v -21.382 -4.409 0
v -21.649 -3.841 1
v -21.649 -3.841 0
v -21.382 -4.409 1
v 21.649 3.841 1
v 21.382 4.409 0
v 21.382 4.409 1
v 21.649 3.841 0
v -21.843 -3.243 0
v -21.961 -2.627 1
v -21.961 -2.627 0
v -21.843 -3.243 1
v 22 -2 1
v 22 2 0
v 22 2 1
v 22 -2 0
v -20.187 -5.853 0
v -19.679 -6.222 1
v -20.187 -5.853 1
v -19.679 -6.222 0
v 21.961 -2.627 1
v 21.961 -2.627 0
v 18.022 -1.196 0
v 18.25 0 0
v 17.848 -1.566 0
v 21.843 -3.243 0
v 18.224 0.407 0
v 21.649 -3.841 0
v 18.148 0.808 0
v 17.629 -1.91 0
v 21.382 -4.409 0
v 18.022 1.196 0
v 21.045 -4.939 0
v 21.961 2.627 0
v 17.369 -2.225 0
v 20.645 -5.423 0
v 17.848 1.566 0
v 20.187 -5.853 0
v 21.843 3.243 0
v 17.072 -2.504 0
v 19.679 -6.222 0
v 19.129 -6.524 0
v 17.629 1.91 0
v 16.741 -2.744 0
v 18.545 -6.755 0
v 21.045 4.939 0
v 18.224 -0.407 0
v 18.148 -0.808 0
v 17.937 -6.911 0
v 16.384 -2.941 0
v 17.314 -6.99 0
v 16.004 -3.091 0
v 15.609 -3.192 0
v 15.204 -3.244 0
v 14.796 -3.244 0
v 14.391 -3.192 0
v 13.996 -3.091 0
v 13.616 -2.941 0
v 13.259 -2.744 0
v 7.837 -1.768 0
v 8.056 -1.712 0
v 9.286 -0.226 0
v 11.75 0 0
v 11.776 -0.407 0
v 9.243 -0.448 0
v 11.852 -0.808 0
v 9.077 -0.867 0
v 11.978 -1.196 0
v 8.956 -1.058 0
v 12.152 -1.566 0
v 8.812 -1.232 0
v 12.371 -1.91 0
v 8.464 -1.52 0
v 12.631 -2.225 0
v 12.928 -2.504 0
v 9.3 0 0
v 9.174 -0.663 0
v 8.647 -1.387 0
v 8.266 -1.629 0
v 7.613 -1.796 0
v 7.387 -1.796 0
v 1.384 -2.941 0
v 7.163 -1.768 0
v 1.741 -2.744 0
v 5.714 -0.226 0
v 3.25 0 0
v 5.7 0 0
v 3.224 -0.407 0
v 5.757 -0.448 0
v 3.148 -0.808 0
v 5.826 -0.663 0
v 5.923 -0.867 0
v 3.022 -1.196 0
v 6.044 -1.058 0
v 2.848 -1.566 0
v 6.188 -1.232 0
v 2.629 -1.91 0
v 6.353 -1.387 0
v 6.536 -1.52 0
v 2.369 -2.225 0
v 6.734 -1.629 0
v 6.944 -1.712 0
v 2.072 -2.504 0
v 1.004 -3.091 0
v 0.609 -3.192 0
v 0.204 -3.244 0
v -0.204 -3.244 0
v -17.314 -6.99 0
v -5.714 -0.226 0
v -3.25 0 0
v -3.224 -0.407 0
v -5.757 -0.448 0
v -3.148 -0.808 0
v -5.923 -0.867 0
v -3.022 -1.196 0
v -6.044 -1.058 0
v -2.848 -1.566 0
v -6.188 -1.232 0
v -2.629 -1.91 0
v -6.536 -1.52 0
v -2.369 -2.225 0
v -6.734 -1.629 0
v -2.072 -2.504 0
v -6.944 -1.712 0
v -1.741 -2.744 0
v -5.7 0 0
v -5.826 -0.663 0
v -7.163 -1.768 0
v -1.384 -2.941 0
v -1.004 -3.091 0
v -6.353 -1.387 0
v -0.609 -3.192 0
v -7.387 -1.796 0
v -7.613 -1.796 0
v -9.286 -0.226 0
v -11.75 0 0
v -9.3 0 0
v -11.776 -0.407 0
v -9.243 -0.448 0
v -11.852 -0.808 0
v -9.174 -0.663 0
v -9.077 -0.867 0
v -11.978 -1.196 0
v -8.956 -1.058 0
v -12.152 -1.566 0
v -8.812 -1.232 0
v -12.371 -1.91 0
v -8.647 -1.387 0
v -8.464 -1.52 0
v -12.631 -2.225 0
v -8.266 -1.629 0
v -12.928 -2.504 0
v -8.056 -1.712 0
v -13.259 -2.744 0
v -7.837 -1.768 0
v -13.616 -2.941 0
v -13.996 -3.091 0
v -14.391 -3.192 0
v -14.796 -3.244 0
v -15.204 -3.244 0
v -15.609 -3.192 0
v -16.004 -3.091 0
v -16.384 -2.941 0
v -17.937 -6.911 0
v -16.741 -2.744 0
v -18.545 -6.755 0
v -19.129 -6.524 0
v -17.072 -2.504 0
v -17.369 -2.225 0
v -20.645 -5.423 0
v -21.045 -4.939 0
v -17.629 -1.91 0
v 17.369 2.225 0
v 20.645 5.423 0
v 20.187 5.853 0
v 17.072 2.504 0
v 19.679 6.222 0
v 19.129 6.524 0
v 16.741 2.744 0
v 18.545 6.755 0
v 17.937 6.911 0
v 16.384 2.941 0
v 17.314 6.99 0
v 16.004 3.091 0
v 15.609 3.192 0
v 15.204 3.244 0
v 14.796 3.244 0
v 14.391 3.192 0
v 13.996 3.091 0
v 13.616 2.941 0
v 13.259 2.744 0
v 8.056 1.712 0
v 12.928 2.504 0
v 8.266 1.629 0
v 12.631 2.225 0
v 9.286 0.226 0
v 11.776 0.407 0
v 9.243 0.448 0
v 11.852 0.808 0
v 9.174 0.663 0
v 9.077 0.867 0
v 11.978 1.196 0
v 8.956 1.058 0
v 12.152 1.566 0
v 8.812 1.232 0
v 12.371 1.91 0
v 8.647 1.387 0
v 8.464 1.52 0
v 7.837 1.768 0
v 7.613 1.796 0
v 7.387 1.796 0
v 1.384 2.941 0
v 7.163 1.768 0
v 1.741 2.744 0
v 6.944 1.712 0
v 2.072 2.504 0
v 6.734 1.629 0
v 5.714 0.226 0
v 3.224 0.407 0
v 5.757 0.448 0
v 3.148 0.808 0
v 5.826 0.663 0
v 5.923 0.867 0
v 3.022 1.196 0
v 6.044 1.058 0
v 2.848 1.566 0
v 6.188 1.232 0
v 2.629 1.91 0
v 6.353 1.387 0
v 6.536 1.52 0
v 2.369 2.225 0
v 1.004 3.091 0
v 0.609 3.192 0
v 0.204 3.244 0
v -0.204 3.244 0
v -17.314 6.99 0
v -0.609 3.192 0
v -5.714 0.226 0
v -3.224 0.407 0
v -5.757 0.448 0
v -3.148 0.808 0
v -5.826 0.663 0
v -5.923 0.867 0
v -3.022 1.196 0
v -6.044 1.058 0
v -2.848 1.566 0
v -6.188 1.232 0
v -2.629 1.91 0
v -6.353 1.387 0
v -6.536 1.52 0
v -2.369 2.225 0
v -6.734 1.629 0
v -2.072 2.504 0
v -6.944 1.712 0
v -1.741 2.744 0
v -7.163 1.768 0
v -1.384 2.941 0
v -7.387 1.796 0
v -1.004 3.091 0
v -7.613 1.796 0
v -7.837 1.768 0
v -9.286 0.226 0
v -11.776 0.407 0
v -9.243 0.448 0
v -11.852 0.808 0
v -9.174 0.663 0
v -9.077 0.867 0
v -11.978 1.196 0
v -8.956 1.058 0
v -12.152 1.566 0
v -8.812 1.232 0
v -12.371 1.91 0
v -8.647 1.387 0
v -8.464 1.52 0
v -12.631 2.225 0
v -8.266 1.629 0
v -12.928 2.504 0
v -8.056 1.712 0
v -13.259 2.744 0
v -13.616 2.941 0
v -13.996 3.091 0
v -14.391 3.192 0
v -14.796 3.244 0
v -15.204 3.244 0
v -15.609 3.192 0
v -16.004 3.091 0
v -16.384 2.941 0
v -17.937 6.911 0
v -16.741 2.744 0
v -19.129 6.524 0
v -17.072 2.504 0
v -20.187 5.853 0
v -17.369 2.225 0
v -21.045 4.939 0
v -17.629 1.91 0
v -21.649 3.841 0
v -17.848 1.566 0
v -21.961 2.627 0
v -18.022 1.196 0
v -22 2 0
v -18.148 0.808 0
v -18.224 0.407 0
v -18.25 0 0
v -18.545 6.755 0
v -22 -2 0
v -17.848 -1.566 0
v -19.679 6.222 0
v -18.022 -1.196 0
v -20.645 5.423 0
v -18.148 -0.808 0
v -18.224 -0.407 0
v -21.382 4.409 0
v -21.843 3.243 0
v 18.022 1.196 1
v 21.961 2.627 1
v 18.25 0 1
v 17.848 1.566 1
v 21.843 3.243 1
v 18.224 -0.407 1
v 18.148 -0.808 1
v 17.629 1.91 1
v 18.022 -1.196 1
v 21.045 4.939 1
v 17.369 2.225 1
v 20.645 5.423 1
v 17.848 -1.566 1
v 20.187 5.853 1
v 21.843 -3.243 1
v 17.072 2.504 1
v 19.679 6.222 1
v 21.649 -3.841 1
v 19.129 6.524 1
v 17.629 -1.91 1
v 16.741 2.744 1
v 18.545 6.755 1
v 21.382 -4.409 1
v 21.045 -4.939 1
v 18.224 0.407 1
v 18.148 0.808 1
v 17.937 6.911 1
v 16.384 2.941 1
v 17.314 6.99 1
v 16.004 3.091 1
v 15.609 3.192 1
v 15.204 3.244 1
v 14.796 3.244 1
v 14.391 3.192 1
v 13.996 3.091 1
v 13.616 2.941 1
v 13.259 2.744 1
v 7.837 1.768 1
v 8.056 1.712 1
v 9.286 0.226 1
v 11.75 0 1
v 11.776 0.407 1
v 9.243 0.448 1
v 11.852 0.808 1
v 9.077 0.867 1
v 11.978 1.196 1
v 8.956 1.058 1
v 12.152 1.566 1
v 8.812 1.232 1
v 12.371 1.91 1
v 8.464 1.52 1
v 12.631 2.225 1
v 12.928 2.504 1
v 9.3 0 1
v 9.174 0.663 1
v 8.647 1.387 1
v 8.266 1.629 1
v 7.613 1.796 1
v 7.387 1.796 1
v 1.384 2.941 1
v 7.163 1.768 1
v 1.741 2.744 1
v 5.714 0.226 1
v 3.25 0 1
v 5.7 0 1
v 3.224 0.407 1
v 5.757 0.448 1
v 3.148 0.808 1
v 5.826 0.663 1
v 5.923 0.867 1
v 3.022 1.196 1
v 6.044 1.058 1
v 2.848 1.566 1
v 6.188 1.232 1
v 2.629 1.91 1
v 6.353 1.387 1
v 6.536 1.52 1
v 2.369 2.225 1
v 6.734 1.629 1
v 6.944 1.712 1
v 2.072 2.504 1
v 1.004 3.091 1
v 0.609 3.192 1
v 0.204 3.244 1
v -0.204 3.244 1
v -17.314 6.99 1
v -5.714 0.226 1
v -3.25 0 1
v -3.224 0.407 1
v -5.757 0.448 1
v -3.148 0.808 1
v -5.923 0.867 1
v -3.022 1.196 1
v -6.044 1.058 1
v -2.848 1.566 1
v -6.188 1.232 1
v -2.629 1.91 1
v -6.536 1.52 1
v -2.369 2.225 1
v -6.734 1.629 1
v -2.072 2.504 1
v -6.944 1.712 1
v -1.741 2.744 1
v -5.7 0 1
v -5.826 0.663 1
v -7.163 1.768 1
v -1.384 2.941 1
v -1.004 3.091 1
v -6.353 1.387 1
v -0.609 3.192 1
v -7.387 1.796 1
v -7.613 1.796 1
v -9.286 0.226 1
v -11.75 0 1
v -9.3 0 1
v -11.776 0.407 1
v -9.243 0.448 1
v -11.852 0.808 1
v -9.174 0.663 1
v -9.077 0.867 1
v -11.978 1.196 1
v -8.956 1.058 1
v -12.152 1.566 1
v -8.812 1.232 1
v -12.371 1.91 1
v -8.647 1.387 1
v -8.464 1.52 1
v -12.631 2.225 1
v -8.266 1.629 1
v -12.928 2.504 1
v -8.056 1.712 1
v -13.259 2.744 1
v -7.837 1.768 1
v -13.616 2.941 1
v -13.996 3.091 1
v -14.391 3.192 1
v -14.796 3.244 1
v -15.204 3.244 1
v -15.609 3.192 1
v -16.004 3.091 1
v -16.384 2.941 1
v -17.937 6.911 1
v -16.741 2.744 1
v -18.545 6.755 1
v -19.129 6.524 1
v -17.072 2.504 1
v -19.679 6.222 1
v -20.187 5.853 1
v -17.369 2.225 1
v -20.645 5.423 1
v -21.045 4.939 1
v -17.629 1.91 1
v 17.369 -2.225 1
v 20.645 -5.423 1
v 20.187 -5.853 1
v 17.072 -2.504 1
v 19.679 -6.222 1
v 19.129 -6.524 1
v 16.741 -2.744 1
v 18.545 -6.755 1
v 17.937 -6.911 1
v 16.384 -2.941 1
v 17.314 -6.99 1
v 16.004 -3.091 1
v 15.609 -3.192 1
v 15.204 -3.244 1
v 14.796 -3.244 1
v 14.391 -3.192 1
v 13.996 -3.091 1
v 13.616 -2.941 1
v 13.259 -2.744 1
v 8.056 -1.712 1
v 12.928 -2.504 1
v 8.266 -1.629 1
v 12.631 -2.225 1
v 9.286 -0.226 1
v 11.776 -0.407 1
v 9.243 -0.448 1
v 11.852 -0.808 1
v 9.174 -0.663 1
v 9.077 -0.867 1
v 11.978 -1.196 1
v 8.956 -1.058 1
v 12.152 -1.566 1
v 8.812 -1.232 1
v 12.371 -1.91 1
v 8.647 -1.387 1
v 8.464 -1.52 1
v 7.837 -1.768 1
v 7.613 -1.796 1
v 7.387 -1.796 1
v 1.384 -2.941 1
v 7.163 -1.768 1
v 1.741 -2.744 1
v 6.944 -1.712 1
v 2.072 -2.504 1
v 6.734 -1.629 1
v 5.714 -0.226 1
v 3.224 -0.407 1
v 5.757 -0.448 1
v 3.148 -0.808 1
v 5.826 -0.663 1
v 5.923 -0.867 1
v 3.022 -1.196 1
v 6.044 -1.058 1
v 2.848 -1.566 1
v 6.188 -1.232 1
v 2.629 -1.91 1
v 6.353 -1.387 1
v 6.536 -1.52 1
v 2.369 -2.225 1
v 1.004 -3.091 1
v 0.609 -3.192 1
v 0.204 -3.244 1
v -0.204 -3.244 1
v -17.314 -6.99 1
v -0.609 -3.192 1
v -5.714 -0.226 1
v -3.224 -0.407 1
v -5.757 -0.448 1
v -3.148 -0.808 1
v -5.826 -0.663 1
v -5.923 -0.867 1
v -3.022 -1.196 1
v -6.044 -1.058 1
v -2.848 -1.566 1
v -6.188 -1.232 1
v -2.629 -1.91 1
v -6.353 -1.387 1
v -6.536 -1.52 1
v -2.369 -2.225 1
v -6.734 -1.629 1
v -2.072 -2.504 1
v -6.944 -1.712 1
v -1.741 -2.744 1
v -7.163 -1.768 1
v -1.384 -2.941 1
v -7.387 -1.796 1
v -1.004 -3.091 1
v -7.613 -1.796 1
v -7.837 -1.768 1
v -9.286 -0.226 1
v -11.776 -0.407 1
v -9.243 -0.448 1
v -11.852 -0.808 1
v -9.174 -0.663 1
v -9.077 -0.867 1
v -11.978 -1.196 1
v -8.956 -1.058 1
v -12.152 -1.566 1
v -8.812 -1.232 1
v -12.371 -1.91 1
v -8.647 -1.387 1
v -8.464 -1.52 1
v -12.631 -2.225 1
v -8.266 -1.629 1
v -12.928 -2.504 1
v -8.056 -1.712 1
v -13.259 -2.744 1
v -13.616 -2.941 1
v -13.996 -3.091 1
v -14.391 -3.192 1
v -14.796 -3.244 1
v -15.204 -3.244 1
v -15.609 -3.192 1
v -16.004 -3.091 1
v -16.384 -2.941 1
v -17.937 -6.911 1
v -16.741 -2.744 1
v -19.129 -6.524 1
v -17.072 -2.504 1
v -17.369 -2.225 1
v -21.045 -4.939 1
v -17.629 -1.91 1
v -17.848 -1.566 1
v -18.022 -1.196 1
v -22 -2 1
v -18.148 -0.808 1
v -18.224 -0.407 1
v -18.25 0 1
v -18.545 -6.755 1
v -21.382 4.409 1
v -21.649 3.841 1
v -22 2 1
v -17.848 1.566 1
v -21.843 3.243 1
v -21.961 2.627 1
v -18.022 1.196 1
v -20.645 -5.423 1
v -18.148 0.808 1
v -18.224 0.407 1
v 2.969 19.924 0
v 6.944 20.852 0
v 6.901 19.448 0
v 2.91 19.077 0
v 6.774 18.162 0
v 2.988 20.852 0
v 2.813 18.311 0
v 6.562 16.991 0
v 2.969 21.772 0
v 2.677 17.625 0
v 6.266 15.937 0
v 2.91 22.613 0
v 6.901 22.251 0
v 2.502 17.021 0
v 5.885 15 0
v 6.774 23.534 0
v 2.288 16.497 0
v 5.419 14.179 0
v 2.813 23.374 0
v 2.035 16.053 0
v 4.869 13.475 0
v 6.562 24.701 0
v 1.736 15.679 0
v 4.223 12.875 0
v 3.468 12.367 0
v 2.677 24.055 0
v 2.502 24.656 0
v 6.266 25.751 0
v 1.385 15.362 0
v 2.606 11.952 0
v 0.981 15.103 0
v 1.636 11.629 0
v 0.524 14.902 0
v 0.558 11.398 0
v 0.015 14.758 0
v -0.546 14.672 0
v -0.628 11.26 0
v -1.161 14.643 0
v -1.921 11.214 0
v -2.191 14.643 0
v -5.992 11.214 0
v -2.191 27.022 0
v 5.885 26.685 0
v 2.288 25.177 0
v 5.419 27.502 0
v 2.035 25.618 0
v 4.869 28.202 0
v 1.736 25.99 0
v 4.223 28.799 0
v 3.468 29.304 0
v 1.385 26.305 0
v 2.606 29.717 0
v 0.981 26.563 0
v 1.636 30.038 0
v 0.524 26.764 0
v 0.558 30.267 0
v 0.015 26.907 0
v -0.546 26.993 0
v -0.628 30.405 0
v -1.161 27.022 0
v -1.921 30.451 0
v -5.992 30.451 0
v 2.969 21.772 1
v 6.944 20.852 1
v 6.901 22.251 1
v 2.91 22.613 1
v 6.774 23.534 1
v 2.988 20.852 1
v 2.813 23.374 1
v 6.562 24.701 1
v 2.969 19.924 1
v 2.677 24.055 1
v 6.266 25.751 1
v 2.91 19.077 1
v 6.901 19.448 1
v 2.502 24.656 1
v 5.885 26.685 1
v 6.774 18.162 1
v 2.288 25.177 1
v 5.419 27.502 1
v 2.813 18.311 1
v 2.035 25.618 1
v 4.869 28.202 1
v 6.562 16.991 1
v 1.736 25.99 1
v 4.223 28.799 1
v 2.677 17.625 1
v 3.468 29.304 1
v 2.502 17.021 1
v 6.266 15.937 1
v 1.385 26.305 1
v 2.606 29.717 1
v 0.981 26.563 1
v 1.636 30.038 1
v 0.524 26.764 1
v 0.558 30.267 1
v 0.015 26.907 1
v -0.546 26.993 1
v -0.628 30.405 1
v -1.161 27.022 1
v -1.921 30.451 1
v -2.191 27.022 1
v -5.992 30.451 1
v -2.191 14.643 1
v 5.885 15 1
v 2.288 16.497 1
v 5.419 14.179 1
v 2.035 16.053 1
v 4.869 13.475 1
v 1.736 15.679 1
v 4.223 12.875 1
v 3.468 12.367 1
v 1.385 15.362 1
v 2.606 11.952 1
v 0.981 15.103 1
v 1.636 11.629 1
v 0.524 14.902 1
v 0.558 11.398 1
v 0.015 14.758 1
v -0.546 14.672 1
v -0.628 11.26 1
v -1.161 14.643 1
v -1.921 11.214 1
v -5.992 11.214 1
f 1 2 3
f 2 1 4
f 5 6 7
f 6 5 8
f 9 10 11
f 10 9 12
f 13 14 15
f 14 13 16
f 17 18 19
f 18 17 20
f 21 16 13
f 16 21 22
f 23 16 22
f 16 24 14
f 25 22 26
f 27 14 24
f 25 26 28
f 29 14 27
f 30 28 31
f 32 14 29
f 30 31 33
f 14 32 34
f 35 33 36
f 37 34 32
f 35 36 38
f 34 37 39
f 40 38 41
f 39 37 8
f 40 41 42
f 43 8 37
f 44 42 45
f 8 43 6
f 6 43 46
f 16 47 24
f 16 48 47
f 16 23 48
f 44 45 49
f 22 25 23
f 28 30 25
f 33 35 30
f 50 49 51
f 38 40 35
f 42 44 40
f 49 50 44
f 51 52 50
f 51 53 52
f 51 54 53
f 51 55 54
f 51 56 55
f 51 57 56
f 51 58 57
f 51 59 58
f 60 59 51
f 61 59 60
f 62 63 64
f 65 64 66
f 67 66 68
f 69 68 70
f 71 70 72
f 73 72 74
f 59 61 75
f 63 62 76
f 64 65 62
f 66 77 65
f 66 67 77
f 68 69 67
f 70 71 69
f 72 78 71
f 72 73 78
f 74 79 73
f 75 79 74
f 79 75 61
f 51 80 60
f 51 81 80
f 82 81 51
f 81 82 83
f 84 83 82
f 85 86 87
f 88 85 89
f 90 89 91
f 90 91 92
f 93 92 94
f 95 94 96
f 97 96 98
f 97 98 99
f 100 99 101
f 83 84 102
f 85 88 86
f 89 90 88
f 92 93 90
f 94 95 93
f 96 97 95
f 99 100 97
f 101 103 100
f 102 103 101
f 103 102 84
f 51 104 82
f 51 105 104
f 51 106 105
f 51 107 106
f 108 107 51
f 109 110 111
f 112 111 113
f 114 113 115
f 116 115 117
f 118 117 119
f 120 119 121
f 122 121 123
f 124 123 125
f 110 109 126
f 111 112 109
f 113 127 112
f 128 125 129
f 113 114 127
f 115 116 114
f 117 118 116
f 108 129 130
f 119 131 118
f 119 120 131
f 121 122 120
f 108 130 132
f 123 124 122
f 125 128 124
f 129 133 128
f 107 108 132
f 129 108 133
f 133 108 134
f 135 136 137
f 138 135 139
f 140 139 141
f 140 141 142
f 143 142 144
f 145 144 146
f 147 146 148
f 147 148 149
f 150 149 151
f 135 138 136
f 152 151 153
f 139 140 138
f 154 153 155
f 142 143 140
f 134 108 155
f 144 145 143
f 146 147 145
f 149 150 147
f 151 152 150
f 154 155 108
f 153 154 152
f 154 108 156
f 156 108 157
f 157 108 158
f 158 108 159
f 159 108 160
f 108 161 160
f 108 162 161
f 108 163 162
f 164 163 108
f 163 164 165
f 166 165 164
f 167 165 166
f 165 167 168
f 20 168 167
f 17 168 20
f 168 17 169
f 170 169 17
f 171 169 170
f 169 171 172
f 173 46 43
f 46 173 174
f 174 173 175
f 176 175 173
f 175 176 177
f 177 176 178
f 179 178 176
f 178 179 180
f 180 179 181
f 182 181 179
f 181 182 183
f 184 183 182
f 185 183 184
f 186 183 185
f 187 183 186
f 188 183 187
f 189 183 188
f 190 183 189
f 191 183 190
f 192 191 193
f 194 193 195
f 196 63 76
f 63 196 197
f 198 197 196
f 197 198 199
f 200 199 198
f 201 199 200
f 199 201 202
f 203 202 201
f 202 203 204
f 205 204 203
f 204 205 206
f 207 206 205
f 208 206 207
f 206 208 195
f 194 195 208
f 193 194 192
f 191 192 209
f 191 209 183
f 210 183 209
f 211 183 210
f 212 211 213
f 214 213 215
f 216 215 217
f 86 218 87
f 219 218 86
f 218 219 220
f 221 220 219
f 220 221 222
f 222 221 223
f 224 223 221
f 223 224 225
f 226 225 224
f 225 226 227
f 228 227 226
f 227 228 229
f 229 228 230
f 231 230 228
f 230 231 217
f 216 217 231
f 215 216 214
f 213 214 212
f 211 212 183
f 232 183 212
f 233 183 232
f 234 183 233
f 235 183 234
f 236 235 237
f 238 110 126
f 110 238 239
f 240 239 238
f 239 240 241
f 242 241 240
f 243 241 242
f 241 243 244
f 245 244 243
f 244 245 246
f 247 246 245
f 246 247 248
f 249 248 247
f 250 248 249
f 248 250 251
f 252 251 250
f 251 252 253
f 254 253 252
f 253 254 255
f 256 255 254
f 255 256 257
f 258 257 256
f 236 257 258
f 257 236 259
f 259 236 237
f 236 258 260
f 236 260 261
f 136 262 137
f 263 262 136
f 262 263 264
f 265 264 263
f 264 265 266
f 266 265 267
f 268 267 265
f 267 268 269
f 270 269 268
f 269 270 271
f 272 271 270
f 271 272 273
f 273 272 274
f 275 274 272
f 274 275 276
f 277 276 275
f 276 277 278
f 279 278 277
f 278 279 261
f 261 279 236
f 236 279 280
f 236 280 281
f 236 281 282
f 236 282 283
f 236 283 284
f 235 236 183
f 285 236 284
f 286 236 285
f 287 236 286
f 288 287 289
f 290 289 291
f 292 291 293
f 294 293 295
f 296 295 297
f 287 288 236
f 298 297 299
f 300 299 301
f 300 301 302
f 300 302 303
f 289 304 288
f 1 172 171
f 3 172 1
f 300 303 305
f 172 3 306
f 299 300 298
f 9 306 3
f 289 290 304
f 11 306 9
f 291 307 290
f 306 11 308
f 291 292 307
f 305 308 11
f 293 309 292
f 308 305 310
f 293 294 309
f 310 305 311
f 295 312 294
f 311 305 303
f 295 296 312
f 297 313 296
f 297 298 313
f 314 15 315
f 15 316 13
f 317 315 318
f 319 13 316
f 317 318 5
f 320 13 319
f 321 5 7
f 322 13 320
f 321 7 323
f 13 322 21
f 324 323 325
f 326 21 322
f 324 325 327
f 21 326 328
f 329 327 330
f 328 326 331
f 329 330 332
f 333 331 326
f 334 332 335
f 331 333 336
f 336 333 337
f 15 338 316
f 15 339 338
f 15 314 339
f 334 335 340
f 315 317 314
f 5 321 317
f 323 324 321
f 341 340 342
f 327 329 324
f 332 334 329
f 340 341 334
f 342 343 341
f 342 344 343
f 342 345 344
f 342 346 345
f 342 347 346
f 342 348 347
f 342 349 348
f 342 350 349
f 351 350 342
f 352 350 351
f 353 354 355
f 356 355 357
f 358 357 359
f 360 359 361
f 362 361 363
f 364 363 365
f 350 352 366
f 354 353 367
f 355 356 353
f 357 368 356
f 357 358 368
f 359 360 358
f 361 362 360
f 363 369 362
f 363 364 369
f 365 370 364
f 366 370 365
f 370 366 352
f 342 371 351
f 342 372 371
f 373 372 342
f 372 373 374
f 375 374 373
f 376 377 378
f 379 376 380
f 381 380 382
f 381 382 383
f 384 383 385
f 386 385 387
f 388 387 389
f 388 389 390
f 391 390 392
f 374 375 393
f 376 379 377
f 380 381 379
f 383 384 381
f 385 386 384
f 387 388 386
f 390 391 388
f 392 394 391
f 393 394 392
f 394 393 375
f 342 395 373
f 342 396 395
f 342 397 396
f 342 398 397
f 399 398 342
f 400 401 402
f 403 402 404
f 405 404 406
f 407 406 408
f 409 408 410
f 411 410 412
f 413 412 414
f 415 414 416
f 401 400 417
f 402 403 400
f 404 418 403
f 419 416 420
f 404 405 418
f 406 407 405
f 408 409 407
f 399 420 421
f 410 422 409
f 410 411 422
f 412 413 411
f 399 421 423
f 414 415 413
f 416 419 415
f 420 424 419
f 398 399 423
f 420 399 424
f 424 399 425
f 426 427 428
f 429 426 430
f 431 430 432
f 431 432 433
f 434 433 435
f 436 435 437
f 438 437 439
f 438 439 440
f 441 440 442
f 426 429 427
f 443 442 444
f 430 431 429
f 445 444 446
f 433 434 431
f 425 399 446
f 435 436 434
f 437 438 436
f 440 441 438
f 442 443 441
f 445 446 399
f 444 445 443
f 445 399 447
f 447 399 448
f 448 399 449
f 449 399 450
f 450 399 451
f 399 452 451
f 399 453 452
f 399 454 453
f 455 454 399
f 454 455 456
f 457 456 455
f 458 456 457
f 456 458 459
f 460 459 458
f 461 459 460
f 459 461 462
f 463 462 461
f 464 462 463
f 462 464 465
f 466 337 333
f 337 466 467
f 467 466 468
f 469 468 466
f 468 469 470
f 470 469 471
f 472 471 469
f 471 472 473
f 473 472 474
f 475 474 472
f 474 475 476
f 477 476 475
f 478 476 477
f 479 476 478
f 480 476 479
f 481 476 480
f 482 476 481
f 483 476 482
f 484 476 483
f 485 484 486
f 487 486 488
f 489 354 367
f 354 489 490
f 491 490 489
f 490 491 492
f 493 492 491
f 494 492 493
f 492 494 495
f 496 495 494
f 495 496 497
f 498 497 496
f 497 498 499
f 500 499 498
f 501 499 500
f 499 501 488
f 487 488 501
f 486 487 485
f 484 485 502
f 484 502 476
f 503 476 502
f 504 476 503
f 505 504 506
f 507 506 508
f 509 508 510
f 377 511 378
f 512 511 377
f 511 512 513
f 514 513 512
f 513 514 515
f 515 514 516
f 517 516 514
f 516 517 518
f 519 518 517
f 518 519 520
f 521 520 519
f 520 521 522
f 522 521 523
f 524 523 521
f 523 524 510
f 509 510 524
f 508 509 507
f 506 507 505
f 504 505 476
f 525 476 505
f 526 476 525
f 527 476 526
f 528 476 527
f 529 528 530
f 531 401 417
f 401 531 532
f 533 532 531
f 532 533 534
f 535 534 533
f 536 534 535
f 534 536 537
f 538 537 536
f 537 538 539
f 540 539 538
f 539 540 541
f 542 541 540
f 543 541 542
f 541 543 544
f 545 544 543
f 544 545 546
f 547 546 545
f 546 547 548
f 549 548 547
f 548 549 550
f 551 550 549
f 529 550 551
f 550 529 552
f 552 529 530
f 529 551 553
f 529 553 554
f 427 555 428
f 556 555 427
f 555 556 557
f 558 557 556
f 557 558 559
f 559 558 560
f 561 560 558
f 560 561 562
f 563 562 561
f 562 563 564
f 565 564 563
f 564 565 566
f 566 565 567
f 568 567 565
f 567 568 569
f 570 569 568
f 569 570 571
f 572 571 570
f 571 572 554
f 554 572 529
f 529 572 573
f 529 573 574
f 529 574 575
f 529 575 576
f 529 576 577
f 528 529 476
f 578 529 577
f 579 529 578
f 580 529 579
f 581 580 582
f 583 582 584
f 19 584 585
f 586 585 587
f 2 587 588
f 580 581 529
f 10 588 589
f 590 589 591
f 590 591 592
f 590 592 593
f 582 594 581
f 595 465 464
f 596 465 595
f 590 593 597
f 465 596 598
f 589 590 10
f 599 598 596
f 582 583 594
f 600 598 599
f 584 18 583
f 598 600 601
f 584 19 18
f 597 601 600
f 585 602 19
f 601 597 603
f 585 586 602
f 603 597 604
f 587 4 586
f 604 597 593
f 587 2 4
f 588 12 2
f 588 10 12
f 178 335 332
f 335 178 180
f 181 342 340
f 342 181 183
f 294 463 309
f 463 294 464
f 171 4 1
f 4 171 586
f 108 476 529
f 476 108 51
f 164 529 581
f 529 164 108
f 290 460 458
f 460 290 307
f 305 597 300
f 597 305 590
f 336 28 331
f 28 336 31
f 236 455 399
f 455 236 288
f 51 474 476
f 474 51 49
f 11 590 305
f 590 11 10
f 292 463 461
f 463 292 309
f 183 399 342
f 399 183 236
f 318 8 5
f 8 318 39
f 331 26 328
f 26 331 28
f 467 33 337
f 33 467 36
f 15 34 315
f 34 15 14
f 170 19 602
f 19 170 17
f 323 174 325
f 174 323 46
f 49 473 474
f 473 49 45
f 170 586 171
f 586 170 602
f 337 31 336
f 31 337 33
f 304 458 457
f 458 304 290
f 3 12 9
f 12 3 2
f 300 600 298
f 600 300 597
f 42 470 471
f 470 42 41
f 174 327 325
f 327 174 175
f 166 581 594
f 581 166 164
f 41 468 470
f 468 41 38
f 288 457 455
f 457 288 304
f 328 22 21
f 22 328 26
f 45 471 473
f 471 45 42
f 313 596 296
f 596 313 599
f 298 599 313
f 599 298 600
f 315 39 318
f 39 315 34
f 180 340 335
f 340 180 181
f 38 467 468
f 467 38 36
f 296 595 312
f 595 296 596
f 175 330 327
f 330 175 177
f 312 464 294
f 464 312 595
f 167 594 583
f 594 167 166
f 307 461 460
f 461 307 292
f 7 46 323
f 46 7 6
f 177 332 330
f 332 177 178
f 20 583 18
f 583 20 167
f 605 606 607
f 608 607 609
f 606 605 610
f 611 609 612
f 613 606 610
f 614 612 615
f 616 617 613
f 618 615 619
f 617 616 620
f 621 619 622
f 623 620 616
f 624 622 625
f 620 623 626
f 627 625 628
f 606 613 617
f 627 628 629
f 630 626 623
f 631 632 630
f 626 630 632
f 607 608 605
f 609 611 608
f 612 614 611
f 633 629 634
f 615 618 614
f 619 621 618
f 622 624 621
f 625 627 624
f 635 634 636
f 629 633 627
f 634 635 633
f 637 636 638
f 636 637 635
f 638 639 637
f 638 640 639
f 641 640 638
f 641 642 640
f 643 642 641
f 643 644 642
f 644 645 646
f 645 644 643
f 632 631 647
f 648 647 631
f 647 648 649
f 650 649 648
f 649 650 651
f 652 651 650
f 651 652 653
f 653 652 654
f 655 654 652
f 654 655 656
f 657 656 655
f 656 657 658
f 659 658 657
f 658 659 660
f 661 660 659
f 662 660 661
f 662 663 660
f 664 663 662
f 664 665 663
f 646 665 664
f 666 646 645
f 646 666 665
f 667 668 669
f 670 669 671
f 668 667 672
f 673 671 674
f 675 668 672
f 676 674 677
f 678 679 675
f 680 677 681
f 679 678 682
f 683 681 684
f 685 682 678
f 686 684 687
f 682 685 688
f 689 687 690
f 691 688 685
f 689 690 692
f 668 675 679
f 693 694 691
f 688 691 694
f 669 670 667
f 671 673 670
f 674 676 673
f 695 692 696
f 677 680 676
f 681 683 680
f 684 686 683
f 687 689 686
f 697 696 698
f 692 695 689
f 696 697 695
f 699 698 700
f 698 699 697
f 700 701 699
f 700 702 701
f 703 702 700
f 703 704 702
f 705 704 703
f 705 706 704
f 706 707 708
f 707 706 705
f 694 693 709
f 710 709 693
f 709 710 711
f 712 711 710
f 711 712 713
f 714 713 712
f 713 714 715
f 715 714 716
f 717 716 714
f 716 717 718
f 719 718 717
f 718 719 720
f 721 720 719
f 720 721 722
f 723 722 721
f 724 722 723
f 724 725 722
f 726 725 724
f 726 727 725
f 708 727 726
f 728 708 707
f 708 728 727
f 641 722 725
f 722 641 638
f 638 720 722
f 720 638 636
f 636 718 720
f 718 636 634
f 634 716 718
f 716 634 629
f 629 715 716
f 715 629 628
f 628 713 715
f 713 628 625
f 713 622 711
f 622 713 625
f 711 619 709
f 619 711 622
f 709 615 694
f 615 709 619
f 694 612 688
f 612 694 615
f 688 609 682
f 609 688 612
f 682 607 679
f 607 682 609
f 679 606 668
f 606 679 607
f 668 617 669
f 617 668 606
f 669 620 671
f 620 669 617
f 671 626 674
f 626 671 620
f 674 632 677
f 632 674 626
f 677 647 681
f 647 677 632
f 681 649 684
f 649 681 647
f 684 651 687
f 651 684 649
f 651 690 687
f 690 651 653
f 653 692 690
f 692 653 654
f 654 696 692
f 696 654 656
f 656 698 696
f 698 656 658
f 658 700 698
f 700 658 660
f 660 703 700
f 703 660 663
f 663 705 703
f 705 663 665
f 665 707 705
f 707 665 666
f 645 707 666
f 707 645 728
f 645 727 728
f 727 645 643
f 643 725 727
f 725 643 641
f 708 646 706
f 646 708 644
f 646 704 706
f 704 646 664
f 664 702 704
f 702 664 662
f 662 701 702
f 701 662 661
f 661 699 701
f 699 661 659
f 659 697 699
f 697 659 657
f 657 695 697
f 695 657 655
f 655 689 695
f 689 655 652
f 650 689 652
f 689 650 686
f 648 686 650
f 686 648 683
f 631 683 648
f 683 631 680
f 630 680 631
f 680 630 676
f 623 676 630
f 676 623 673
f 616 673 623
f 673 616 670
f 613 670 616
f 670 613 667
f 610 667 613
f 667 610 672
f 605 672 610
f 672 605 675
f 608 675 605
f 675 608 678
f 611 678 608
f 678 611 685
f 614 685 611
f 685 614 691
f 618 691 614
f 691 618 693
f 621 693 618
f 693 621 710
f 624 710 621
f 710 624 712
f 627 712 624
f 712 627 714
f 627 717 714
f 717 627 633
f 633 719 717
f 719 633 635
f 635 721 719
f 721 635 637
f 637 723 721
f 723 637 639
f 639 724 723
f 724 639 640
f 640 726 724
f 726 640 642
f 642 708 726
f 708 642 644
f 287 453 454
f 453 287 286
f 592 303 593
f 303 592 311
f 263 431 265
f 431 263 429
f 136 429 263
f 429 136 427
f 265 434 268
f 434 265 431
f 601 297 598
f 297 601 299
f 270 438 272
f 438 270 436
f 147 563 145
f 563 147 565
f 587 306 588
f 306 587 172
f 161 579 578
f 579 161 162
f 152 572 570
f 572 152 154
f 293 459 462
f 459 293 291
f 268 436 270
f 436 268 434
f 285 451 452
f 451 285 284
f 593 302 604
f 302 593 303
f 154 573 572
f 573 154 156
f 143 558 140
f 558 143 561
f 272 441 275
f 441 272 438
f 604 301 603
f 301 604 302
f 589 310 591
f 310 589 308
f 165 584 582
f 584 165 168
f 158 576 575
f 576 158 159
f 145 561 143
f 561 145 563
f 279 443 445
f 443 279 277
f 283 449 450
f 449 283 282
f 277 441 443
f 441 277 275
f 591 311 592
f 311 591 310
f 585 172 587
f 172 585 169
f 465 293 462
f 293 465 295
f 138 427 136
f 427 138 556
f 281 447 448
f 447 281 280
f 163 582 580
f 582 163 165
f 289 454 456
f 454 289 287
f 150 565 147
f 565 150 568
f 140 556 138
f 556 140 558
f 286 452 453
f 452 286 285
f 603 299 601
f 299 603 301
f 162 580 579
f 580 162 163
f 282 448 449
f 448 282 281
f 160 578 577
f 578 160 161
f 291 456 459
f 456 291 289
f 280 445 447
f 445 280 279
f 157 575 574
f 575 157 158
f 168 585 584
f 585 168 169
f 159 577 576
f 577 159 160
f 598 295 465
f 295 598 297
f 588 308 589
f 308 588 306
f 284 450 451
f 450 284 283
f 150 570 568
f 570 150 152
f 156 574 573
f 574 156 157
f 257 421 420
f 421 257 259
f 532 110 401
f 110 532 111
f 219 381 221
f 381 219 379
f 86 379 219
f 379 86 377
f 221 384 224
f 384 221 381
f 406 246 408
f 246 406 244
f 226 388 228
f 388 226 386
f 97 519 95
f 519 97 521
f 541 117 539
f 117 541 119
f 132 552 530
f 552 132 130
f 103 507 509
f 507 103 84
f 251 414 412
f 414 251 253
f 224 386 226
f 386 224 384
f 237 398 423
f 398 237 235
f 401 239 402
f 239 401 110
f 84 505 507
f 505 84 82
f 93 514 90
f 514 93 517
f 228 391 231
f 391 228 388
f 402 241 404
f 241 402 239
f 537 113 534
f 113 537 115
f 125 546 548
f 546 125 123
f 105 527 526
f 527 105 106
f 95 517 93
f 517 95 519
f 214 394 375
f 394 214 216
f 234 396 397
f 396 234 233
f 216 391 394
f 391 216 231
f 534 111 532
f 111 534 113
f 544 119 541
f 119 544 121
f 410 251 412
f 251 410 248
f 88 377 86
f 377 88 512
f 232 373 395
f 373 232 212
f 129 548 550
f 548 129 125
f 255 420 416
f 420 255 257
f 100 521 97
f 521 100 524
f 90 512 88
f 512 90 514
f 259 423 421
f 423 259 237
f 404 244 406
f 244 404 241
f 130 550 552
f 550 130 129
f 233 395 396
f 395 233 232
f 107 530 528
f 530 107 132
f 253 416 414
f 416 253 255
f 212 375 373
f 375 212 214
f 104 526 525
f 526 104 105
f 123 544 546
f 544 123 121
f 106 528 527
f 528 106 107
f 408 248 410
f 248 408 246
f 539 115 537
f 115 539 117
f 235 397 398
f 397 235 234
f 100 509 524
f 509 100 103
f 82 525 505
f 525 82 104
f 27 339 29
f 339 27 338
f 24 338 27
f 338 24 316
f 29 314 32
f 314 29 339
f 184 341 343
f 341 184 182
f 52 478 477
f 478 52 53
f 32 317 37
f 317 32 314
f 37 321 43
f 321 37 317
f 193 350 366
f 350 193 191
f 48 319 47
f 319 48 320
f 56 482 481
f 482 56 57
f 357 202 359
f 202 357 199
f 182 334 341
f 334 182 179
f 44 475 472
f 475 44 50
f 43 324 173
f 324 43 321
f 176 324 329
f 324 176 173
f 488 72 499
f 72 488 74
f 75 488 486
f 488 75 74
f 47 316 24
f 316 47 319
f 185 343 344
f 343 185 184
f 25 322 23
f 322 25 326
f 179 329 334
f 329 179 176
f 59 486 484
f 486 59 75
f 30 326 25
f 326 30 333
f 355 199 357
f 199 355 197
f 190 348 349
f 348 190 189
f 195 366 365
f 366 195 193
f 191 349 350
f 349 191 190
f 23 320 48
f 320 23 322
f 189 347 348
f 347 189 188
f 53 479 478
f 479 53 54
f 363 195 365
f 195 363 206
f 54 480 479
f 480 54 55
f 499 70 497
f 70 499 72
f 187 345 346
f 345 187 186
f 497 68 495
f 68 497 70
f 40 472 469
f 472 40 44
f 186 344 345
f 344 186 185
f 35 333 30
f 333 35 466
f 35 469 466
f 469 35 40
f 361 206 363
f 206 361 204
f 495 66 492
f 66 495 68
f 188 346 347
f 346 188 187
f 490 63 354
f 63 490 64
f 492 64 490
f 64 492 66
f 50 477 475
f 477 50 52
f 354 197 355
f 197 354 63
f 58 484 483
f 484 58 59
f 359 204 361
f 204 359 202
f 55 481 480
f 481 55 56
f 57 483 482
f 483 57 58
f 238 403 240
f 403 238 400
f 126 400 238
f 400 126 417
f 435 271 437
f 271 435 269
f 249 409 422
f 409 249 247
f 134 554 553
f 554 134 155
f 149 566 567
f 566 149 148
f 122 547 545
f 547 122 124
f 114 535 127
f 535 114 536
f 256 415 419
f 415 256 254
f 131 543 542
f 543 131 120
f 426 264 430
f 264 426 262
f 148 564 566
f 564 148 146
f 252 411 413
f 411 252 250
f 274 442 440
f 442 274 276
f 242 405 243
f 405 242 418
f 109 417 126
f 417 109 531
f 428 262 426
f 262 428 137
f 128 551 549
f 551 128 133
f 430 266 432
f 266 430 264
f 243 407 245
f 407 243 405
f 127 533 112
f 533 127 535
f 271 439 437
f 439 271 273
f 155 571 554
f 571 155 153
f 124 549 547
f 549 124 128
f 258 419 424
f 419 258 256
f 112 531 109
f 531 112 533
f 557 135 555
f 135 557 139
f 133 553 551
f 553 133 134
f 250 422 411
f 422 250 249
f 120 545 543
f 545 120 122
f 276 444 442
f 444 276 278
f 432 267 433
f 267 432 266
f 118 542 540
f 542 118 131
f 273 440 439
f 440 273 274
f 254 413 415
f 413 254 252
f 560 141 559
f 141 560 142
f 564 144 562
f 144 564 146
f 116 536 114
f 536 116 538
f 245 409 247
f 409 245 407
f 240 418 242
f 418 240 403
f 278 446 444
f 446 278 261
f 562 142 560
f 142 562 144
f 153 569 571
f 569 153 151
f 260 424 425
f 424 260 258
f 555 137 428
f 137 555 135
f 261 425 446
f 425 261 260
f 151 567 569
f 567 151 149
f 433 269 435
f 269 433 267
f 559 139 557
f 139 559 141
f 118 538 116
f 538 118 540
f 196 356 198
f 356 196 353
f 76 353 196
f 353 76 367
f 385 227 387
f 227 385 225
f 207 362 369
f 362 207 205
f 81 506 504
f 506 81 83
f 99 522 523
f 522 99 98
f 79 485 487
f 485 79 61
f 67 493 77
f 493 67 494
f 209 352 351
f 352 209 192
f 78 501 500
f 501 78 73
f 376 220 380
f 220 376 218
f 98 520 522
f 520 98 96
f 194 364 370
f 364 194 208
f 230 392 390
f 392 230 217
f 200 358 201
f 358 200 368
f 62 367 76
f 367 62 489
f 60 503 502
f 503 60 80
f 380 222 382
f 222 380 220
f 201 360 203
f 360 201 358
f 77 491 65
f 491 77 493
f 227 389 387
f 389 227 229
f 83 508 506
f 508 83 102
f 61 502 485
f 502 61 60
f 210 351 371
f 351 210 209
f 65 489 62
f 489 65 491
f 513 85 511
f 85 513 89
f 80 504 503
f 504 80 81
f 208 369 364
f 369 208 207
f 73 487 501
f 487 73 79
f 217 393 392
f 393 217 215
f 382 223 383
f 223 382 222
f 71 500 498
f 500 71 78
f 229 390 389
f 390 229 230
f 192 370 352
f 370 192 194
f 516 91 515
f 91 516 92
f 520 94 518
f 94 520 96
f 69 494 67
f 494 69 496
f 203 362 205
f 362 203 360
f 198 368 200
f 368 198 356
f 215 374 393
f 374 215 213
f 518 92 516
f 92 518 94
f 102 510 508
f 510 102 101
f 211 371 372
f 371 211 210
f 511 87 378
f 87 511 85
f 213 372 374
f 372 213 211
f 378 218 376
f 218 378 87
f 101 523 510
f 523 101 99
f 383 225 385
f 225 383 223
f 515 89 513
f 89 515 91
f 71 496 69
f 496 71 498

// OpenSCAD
$fn = 50;


difference() {
	union() {
		hull() {
			translate(v = [-17.0000000000, 2.0000000000, 0]) {
				cylinder(h = 1, r = 5);
			}
			translate(v = [17.0000000000, 2.0000000000, 0]) {
				cylinder(h = 1, r = 5);
			}
			translate(v = [-17.0000000000, -2.0000000000, 0]) {
				cylinder(h = 1, r = 5);
			}
			translate(v = [17.0000000000, -2.0000000000, 0]) {
				cylinder(h = 1, r = 5);
			}
		}
		translate(v = [0, 30.0000000000, 0]) {
			linear_extrude(height = 1) {
				text(font = "DejaVu Sans Mono:style=Bold", halign = "center", size = 19.0000000000, text = "D", valign = "top");
			}
		}
	}
	union() {
		translate(v = [-15.0000000000, 0.0000000000, 0]) {
			translate(v = [0, 0, -100]) {
				cylinder(h = 200, r = 3.2500000000);
			}
		}
		translate(v = [0, 0, -100]) {
			cylinder(h = 200, r = 3.2500000000);
		}
		translate(v = [15.0000000000, 0.0000000000, 0]) {
			translate(v = [0, 0, -100]) {
				cylinder(h = 200, r = 3.2500000000);
			}
		}
		translate(v = [-15.0000000000, 0.0000000000, 0]) {
			translate(v = [0, 0, -100]) {
				cylinder(h = 200, r = 1.8000000000);
			}
		}
		translate(v = [-7.5000000000, 0.0000000000, 0]) {
			translate(v = [0, 0, -100]) {
				cylinder(h = 200, r = 1.8000000000);
			}
		}
		translate(v = [0, 0, -100]) {
			cylinder(h = 200, r = 1.8000000000);
		}
		translate(v = [7.5000000000, 0.0000000000, 0]) {
			translate(v = [0, 0, -100]) {
				cylinder(h = 200, r = 1.8000000000);
			}
		}
		translate(v = [15.0000000000, 0.0000000000, 0]) {
			translate(v = [0, 0, -100]) {
				cylinder(h = 200, r = 1.8000000000);
			}
		}
	}
}
